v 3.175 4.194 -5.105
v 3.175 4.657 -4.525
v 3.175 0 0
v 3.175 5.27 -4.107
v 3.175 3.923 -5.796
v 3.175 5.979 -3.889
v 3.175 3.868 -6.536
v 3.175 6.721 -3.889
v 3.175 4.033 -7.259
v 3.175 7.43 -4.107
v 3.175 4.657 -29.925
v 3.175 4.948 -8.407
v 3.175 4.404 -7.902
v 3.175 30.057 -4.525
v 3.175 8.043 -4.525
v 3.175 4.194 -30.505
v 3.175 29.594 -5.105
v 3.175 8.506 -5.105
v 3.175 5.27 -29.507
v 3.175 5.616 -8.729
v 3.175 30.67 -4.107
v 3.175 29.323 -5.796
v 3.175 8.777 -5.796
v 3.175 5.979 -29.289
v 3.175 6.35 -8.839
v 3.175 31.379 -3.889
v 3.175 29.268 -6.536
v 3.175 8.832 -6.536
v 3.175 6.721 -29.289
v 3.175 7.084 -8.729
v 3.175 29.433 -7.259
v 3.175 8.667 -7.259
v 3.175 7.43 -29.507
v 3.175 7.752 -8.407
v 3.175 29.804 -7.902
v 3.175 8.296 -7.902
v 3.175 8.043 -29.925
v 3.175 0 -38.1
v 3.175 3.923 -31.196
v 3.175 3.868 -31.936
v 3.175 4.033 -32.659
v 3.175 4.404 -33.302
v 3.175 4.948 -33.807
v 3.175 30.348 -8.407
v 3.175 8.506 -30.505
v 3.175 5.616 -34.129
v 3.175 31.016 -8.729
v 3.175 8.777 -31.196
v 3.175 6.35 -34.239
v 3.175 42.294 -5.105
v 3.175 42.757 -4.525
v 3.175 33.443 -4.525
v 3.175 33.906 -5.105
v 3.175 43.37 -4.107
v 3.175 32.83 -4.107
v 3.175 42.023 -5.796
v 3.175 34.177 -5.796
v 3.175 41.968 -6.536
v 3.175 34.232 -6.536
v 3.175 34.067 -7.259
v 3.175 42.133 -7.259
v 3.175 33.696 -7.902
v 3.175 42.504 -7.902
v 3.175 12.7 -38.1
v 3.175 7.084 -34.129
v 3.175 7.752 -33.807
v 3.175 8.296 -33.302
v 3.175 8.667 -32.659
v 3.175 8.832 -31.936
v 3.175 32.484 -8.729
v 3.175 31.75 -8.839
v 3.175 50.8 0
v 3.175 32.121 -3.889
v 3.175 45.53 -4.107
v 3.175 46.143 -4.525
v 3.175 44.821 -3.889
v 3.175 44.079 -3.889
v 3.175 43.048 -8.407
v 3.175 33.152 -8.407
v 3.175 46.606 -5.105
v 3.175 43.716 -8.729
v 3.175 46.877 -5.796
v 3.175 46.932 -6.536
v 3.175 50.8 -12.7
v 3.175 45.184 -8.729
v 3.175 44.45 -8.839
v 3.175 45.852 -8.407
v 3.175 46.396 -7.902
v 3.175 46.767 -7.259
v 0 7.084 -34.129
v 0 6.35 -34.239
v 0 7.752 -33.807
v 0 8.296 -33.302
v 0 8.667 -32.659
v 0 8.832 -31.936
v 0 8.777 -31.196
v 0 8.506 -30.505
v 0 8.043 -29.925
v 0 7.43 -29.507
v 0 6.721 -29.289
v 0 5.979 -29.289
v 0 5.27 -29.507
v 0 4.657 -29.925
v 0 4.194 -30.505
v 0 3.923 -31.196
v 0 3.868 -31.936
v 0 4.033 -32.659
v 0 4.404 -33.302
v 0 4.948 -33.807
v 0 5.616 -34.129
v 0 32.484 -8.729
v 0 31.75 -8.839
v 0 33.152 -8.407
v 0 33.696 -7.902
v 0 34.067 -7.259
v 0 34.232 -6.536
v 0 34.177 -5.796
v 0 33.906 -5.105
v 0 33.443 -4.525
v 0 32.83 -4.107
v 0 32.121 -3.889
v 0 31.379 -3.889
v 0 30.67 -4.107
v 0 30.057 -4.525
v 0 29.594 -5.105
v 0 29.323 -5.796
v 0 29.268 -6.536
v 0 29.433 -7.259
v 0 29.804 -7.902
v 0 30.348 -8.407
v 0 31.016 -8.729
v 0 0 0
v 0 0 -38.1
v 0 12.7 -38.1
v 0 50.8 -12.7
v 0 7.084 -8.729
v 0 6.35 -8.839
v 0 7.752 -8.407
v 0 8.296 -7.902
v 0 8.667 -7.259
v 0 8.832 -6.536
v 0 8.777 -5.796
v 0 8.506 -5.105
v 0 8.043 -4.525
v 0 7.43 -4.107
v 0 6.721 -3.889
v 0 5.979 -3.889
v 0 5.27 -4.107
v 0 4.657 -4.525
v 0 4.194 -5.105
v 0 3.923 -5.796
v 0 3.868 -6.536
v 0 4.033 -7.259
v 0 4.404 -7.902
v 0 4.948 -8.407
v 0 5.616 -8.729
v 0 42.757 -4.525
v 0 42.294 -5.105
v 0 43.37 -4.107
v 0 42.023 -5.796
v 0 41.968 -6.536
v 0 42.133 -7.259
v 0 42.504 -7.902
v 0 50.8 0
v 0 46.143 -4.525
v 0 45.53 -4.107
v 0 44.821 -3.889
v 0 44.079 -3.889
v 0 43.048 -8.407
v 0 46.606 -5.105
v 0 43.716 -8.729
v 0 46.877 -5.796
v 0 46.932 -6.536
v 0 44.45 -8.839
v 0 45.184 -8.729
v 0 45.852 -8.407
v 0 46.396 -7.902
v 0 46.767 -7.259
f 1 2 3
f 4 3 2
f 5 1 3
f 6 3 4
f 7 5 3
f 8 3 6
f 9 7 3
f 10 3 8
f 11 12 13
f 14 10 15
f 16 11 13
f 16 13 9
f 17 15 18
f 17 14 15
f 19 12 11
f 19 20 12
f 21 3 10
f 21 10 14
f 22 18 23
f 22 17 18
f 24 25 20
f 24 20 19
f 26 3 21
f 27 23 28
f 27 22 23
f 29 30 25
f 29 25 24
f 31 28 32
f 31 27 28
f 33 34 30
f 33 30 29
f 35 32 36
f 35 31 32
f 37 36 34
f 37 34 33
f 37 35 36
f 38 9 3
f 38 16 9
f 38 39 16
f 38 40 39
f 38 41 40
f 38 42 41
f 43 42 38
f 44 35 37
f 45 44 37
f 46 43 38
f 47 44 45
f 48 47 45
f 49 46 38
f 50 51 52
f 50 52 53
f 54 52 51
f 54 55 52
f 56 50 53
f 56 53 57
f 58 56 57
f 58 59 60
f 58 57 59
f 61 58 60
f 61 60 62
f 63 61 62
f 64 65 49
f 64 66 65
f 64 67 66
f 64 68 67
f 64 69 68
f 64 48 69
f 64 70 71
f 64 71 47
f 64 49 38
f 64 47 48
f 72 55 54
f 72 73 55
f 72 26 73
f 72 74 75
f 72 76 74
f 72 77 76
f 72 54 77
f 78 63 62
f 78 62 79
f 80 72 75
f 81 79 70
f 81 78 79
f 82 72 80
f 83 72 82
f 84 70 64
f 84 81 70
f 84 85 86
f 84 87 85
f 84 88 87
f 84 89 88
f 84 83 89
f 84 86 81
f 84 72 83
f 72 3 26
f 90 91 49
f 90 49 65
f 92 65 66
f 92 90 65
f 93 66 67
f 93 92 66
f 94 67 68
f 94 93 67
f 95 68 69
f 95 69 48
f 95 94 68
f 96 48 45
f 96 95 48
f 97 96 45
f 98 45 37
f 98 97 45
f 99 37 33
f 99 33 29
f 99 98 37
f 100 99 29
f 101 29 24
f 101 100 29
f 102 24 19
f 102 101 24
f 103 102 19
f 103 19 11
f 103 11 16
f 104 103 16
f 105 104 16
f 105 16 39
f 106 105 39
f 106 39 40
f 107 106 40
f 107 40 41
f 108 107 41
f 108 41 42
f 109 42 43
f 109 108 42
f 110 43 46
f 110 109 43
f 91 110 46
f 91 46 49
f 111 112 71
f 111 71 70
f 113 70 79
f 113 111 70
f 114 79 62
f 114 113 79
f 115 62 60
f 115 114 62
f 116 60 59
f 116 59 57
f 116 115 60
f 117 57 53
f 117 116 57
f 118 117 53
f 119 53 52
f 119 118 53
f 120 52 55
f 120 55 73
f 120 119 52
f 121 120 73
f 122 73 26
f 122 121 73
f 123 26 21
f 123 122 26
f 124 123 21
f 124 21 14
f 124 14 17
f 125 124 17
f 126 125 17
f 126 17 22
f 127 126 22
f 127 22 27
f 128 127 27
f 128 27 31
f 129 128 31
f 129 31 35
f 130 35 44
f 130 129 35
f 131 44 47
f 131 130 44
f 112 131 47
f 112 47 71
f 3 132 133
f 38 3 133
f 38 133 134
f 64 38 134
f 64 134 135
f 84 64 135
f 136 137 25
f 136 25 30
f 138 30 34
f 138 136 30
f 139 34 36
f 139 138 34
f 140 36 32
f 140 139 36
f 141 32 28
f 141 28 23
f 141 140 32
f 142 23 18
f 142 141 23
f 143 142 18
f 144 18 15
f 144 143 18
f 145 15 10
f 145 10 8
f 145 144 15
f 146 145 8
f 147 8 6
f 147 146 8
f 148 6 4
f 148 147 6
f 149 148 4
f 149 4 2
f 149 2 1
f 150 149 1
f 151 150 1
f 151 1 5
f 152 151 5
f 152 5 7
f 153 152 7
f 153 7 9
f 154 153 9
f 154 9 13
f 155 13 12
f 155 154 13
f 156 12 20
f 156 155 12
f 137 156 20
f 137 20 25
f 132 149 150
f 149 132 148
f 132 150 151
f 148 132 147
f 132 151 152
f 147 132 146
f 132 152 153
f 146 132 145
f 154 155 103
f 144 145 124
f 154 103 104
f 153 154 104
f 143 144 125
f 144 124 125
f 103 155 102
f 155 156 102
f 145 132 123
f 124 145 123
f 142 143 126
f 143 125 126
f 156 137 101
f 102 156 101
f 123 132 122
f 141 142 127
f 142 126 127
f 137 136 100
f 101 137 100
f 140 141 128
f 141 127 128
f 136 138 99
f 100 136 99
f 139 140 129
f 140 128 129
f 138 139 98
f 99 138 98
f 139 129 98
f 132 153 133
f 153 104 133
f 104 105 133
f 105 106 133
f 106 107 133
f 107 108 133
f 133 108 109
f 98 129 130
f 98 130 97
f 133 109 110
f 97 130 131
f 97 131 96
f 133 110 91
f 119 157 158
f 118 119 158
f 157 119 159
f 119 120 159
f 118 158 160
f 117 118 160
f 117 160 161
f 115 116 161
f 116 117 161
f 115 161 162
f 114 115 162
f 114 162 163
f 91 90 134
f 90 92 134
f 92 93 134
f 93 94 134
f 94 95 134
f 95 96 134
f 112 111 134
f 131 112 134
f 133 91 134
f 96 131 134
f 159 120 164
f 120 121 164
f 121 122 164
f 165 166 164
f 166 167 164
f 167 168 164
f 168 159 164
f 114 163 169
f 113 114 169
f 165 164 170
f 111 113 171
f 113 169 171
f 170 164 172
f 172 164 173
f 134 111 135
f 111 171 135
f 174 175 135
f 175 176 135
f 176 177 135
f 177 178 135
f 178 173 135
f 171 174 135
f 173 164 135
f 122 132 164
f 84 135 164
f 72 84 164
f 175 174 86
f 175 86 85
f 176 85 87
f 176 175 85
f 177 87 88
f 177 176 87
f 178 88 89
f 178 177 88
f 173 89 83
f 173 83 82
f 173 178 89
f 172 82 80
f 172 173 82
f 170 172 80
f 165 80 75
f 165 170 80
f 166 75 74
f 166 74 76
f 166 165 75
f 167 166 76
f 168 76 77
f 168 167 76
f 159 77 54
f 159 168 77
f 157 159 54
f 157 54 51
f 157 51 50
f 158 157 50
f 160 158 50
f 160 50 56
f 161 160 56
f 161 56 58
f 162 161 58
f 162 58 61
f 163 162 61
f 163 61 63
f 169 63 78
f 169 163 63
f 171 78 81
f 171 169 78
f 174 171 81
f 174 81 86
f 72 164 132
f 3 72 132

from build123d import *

# Parameters (mm, degrees)
SKETCH3_R           = 2.4892
BOSS_EXTRUDE1_DEPTH = 3.175


with BuildPart() as part:
    # Sketch3 → Boss-Extrude1 (new body)
    with BuildSketch(Plane(origin=(0, 0, 0), x_dir=(0, 0, -1), z_dir=(1, 0, 0))):
        Polygon((0, 0), (38.1, 0), (38.1, 12.7), (12.7, 50.8), (0, 50.8), align=None)
        with Locations((6.35, 44.45)):
            Circle(SKETCH3_R, mode=Mode.SUBTRACT)
        with Locations((6.35, 31.75)):
            Circle(SKETCH3_R, mode=Mode.SUBTRACT)
        with Locations((6.35, 6.35)):
            Circle(SKETCH3_R, mode=Mode.SUBTRACT)
        with Locations((31.75, 6.35)):
            Circle(SKETCH3_R, mode=Mode.SUBTRACT)
    extrude(amount=BOSS_EXTRUDE1_DEPTH)


solid = part.part
